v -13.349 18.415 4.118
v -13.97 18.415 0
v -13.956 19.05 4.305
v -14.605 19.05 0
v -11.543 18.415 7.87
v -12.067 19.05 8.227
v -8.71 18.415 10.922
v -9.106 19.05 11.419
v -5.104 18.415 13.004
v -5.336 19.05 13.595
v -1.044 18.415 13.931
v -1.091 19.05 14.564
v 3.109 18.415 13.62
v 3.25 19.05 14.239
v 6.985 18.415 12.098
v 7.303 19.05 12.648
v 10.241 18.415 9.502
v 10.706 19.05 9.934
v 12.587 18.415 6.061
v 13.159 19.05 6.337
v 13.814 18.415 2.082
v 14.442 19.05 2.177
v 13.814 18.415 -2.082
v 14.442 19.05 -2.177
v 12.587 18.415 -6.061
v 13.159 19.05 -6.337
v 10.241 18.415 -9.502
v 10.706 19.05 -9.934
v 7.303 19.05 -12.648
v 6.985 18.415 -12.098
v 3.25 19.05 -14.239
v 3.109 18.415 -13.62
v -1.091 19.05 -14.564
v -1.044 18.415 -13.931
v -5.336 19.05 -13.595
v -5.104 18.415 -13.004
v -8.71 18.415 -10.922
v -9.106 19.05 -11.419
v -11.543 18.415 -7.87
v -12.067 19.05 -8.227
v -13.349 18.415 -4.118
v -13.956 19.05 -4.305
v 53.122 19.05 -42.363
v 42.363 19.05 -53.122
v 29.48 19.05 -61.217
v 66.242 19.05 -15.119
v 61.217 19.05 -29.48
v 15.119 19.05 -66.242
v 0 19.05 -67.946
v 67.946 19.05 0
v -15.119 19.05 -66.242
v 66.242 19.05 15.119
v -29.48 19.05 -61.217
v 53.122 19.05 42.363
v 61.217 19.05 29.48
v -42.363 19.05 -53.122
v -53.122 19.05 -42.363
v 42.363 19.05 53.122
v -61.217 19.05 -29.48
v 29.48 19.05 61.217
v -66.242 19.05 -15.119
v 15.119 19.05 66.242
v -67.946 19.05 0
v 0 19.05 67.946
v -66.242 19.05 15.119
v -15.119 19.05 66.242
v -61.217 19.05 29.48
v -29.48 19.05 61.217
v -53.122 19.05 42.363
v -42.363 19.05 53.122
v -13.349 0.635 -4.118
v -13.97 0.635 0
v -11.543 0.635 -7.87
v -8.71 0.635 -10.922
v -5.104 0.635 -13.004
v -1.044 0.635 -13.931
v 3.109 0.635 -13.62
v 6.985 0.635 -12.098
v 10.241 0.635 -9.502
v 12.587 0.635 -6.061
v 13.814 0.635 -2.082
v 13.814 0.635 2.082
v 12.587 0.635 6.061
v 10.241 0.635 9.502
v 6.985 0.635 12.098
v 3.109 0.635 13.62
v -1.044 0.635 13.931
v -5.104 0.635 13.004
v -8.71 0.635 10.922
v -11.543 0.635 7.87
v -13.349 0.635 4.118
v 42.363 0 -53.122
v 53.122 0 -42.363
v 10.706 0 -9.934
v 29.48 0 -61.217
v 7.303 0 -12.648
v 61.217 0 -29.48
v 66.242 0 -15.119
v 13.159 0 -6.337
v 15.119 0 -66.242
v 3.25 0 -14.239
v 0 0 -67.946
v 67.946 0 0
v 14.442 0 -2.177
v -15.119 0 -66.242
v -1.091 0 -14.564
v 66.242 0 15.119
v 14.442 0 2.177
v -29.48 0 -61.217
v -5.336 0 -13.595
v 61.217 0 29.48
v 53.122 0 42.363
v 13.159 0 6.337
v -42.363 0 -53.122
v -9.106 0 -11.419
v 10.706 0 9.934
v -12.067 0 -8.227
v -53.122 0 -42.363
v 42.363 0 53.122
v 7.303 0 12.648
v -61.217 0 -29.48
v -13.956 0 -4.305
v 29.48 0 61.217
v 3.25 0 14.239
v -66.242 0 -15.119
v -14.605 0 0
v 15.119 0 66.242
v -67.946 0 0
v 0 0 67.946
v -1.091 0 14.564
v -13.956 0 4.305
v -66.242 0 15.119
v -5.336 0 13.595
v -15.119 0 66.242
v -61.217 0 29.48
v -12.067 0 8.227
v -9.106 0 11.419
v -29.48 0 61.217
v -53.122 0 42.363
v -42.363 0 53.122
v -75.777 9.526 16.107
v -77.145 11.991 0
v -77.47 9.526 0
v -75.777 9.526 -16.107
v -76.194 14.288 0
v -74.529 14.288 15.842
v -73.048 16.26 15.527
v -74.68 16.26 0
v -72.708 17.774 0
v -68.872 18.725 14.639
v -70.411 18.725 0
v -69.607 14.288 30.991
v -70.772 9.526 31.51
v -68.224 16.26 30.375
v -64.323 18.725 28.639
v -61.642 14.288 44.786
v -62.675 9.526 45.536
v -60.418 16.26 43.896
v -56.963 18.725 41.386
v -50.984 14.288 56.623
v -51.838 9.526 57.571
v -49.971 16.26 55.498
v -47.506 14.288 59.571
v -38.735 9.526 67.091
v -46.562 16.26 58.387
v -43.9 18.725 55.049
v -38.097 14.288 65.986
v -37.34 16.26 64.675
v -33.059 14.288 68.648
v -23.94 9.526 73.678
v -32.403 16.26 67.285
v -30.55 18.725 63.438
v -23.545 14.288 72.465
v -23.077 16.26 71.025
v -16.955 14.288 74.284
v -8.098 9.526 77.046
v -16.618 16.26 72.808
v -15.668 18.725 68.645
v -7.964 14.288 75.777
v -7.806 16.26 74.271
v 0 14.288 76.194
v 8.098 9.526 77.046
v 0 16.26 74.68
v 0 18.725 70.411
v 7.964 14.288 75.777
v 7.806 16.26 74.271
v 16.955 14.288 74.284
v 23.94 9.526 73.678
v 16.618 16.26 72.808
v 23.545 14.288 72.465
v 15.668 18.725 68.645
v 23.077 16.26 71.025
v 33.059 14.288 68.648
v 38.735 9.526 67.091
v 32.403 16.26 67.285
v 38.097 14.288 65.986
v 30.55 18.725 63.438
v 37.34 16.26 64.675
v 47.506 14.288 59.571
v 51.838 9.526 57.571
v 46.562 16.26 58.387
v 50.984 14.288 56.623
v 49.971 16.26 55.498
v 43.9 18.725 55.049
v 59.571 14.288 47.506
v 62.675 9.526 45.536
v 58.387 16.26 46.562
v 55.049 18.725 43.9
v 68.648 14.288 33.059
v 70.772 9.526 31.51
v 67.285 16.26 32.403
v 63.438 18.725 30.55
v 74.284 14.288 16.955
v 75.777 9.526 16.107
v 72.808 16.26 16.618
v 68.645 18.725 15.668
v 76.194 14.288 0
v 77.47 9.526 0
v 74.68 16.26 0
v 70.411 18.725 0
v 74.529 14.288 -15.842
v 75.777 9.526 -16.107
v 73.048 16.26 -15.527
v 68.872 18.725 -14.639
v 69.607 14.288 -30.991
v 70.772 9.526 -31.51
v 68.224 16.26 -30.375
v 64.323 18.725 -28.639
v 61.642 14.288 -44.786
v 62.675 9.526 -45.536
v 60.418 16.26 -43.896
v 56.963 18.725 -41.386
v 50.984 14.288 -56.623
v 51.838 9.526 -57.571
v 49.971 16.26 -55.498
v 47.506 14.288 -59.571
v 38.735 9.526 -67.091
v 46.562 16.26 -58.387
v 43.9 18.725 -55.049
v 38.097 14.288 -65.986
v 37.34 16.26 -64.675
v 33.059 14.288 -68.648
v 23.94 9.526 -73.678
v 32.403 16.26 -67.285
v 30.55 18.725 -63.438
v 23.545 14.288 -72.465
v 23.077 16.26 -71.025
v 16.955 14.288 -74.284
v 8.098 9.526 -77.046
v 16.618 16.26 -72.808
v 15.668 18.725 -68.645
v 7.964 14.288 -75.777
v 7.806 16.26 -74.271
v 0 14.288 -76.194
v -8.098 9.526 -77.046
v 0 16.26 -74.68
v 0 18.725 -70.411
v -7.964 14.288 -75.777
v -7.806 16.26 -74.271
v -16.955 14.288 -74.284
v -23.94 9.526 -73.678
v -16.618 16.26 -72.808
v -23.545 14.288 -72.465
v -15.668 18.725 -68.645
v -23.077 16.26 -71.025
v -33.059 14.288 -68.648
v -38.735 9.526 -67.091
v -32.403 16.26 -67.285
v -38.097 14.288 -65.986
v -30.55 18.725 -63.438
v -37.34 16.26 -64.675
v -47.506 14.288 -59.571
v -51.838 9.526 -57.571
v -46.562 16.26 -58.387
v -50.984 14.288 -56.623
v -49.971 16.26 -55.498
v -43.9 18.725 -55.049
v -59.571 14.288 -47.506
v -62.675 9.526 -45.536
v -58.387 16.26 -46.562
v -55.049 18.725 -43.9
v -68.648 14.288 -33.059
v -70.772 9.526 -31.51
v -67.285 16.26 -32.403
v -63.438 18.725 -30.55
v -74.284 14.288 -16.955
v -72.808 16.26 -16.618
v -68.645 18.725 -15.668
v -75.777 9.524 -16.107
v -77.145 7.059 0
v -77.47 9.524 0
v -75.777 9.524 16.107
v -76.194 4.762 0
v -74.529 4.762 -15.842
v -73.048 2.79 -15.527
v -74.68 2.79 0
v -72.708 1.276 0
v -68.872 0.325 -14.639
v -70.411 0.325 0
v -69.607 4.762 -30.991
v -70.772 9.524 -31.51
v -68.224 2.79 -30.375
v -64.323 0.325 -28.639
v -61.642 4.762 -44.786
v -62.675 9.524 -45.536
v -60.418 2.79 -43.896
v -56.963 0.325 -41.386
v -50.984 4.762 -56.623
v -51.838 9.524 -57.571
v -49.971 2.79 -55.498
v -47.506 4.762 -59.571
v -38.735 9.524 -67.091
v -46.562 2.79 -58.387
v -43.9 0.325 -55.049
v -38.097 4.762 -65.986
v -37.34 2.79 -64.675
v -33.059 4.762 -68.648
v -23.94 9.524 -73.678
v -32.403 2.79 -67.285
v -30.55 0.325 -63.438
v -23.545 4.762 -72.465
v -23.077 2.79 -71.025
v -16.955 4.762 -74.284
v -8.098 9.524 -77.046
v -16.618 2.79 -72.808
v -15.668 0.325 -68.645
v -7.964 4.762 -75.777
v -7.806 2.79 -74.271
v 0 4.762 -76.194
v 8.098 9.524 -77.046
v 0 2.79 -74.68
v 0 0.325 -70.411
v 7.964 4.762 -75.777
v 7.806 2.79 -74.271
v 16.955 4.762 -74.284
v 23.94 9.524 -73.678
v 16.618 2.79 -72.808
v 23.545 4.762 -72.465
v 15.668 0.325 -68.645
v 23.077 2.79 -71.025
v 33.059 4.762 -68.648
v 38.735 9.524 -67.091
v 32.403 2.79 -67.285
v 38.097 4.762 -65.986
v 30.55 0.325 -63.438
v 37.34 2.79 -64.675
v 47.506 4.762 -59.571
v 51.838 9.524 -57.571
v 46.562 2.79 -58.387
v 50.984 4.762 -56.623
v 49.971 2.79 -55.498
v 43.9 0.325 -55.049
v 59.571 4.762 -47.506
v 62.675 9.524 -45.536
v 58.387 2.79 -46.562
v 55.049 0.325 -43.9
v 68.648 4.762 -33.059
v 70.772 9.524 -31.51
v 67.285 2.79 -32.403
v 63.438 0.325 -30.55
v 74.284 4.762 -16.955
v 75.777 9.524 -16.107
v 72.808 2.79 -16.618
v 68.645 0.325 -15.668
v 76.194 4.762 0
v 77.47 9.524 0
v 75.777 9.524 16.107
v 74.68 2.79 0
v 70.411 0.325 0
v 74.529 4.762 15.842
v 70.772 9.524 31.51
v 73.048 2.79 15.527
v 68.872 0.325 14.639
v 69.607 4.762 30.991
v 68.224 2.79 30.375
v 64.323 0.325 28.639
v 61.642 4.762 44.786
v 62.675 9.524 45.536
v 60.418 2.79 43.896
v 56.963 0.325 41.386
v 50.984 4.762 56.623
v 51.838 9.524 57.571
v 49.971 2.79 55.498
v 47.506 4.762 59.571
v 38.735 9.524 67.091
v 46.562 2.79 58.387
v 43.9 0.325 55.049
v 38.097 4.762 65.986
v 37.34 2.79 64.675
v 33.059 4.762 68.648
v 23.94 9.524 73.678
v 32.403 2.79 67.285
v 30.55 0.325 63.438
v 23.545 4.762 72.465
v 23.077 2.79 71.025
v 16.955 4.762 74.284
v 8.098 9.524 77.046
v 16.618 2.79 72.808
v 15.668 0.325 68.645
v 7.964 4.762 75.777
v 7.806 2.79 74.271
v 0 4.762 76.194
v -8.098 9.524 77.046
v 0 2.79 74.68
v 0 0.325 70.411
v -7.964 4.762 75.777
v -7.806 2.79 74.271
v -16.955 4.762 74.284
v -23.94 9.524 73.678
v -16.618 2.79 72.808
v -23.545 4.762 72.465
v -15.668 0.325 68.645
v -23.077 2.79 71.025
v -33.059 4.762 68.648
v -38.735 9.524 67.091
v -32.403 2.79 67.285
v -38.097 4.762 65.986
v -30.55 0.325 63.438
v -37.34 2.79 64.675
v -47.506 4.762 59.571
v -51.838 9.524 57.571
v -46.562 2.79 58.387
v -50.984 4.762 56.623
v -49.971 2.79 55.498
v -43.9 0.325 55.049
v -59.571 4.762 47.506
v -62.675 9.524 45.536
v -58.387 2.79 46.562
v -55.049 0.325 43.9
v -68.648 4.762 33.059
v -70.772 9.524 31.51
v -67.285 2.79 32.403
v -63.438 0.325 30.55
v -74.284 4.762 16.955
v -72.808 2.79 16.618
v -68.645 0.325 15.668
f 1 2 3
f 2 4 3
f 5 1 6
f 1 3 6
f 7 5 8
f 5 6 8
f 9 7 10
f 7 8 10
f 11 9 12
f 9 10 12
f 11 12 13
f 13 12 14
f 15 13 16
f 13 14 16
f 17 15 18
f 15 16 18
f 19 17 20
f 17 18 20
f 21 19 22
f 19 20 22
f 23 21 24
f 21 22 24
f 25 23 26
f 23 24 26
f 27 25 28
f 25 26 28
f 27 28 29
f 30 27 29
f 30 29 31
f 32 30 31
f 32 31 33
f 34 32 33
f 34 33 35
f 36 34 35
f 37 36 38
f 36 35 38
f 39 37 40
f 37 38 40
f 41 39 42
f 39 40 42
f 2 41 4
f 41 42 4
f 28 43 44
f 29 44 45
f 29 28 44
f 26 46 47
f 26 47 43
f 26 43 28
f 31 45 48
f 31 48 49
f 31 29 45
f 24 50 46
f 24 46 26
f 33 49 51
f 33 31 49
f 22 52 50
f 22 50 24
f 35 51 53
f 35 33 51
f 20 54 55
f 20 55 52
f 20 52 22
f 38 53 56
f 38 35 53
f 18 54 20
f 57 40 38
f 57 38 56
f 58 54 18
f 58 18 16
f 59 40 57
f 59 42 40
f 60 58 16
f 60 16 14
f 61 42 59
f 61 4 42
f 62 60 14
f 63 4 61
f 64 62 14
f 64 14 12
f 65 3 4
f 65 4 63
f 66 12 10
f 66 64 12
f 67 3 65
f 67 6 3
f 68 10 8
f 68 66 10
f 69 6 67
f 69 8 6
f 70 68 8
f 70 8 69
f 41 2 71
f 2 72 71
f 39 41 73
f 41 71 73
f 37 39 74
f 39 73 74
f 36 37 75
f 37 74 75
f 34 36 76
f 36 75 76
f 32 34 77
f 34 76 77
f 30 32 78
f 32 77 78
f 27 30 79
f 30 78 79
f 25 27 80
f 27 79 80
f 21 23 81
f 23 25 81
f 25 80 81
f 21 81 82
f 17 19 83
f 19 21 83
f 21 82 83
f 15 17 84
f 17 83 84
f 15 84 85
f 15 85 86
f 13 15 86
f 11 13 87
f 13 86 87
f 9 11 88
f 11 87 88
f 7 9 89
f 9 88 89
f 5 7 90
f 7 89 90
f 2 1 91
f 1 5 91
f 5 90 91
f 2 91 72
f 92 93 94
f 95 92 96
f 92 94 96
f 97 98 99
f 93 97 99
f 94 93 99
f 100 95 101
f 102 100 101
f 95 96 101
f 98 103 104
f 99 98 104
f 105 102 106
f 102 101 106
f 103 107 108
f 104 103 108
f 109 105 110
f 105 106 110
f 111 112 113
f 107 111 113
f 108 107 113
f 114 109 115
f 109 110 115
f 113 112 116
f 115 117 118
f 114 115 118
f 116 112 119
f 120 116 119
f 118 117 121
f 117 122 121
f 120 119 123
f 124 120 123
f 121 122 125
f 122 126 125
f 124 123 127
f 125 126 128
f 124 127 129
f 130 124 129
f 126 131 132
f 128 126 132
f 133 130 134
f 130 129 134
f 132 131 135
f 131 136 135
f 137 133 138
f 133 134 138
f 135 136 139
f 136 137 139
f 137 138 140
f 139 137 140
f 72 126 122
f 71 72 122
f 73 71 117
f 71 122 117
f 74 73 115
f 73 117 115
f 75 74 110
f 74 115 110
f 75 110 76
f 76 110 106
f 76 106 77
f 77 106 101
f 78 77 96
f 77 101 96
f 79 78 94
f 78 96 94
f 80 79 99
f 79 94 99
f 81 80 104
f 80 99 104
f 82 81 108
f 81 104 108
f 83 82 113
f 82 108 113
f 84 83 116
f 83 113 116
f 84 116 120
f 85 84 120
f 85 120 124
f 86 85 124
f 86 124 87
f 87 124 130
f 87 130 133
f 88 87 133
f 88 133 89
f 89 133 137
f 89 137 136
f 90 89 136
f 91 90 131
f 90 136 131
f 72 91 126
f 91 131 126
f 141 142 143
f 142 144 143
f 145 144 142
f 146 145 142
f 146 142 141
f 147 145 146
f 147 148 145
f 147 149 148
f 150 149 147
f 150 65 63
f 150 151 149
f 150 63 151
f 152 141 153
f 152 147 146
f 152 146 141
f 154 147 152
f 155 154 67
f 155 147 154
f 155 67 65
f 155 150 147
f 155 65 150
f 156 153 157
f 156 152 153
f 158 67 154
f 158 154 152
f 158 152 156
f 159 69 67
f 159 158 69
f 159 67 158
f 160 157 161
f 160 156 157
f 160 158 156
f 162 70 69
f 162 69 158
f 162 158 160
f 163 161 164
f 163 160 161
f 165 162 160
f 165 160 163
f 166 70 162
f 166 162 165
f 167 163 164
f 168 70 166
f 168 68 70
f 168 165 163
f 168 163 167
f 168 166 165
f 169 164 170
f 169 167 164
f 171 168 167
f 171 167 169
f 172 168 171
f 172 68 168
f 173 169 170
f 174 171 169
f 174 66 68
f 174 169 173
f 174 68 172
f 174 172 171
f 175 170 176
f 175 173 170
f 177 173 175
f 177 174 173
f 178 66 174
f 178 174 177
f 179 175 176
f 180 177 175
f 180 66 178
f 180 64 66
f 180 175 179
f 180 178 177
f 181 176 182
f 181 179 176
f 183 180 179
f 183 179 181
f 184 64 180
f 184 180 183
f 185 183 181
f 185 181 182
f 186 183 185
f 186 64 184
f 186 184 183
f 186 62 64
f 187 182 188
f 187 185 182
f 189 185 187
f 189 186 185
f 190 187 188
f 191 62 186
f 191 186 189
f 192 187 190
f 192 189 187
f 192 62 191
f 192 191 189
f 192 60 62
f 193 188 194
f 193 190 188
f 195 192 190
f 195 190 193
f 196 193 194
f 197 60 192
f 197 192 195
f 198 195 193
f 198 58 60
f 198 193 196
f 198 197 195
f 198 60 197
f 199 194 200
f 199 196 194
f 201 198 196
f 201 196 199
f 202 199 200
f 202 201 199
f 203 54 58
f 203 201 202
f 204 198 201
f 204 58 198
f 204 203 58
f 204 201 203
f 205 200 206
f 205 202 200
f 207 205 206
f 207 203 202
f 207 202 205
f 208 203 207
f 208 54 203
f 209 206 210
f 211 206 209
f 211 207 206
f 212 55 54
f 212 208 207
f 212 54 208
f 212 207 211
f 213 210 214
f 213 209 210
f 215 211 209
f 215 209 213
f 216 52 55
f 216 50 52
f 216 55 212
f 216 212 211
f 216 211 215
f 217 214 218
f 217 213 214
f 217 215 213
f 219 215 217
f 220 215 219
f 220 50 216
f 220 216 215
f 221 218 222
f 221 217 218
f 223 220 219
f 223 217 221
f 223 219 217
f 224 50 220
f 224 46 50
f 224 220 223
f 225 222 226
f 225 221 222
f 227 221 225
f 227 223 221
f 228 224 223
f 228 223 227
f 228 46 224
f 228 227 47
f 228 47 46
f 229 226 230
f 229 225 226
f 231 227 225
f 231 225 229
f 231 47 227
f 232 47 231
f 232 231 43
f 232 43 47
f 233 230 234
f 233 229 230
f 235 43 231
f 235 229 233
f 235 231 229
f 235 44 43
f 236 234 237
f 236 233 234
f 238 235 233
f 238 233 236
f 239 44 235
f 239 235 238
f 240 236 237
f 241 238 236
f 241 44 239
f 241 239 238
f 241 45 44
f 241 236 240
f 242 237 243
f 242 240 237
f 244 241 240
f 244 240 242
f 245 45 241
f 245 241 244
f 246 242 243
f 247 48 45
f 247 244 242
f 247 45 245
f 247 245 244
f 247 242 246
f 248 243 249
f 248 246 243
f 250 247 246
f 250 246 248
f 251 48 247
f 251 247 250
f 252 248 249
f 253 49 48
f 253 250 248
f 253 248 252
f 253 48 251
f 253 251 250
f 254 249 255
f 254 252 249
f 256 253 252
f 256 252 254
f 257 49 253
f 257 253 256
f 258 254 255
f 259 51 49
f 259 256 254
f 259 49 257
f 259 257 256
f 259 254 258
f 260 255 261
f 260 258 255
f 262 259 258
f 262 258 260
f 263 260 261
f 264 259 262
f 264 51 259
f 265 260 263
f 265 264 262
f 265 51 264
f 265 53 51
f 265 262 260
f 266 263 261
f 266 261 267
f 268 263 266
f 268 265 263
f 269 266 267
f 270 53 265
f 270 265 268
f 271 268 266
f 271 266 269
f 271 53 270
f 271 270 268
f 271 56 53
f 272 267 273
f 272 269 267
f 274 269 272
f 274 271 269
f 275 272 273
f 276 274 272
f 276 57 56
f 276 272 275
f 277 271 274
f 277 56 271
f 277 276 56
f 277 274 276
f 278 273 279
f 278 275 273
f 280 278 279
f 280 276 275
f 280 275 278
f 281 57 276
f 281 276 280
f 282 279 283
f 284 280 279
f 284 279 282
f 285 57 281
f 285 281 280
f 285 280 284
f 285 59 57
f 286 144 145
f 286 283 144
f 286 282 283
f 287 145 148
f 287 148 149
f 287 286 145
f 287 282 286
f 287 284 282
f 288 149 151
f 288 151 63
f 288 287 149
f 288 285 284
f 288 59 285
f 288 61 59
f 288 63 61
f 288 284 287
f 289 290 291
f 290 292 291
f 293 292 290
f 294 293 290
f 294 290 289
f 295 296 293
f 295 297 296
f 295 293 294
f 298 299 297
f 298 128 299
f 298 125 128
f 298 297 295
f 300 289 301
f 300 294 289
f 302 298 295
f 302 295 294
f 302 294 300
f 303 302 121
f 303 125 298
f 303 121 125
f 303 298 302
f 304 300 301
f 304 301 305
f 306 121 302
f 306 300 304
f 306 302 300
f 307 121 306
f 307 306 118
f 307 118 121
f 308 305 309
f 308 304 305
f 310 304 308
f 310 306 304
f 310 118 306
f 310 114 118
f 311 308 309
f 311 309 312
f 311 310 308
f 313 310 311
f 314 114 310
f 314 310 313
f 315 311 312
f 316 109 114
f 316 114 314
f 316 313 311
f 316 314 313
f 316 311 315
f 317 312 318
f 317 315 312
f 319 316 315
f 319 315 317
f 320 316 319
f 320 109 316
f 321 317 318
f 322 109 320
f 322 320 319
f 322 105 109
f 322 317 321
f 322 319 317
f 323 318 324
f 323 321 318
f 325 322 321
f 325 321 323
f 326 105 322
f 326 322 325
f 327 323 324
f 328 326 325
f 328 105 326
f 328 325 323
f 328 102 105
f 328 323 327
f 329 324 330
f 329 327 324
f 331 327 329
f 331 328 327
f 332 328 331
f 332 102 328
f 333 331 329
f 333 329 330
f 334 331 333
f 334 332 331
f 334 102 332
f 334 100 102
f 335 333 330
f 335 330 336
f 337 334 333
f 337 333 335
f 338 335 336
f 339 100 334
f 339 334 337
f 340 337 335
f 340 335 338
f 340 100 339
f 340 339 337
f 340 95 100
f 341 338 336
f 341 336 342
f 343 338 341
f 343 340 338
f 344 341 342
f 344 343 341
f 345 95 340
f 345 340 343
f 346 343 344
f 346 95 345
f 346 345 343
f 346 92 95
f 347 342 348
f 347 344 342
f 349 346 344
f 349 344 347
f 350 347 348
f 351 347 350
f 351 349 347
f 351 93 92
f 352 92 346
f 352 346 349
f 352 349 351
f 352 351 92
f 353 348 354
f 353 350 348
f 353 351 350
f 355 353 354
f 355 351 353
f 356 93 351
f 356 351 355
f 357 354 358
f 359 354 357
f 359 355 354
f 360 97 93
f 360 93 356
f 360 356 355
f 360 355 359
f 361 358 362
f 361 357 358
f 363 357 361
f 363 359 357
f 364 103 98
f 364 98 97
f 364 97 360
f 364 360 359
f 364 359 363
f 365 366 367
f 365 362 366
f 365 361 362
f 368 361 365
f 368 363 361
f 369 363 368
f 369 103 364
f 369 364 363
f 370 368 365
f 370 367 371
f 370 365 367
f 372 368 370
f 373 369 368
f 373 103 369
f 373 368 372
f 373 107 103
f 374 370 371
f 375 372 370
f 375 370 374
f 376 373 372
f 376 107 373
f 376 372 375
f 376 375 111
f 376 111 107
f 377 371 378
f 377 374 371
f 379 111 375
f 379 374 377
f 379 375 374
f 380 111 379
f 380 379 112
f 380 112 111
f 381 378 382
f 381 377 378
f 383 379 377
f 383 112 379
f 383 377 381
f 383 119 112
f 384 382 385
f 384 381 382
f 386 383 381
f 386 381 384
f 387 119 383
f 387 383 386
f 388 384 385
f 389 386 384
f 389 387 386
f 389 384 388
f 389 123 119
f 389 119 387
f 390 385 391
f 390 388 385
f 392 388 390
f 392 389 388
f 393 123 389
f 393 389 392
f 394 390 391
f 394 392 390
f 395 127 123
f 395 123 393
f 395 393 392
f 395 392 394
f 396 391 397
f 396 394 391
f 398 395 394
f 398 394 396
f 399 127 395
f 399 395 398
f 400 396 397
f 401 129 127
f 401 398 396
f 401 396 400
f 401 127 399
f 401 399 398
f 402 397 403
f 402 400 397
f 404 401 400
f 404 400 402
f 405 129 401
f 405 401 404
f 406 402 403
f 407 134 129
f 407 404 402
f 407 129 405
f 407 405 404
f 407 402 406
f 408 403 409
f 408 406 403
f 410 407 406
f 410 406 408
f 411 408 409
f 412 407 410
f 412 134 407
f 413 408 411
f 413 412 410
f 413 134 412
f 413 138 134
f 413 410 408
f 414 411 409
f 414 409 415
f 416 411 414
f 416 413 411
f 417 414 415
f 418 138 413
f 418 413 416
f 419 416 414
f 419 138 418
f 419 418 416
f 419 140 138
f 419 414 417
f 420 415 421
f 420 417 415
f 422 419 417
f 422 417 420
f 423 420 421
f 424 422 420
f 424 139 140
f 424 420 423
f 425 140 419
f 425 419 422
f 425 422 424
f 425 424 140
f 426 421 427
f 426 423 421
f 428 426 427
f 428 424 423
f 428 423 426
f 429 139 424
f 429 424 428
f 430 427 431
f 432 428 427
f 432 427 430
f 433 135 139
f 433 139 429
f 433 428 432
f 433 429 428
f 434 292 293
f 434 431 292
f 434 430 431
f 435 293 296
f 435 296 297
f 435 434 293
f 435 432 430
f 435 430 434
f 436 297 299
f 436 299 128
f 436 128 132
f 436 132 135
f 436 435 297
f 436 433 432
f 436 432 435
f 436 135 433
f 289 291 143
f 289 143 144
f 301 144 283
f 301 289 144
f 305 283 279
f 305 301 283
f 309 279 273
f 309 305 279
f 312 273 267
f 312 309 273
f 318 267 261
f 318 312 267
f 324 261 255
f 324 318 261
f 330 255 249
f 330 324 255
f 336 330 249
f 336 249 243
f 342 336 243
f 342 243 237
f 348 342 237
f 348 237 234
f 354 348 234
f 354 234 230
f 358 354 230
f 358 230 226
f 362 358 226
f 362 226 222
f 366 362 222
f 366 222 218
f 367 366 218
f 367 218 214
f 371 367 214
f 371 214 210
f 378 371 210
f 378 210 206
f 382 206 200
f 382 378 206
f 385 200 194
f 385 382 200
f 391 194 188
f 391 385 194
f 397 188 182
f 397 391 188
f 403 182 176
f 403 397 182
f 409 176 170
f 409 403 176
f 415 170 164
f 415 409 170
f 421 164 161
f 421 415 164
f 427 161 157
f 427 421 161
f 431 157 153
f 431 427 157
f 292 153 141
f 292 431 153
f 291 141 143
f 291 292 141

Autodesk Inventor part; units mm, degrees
ref_plane "YZ Plane" through (0, 0, 0) normal (1, 0, 0) x (0, 1, 0)
ref_plane "XZ Plane" through (0, 0, 0) normal (0, 1, 0) x (-1, 0, 0)
ref_plane "XY Plane" through (0, 0, 0) normal (0, 0, 1) x (1, 0, 0)
sketch "Sketch1" plane through (0, 0, 0) normal (0, 1, 0) x (-1, 0, 0)
  circle A0 centre (0, 0) radius 77.47
  circle A1 centre (0, 0) radius 13.97
  dimension "d0" = 154.94
  dimension "d1" = 27.94
extrude "Extrusion1" add sketch "Sketch1" along normal blind 19.05
fillet "Fillet1" radius 9.525 2 edges at (77.47, 19.05, 0) (77.47, 0, 0)
chamfer "Chamfer1" distance 0.635 angle 45 2 edges at (13.97, 19.05, 0) (13.97, 0, 0)
properties part number "5lb_weight" material "Iron, Cast"
